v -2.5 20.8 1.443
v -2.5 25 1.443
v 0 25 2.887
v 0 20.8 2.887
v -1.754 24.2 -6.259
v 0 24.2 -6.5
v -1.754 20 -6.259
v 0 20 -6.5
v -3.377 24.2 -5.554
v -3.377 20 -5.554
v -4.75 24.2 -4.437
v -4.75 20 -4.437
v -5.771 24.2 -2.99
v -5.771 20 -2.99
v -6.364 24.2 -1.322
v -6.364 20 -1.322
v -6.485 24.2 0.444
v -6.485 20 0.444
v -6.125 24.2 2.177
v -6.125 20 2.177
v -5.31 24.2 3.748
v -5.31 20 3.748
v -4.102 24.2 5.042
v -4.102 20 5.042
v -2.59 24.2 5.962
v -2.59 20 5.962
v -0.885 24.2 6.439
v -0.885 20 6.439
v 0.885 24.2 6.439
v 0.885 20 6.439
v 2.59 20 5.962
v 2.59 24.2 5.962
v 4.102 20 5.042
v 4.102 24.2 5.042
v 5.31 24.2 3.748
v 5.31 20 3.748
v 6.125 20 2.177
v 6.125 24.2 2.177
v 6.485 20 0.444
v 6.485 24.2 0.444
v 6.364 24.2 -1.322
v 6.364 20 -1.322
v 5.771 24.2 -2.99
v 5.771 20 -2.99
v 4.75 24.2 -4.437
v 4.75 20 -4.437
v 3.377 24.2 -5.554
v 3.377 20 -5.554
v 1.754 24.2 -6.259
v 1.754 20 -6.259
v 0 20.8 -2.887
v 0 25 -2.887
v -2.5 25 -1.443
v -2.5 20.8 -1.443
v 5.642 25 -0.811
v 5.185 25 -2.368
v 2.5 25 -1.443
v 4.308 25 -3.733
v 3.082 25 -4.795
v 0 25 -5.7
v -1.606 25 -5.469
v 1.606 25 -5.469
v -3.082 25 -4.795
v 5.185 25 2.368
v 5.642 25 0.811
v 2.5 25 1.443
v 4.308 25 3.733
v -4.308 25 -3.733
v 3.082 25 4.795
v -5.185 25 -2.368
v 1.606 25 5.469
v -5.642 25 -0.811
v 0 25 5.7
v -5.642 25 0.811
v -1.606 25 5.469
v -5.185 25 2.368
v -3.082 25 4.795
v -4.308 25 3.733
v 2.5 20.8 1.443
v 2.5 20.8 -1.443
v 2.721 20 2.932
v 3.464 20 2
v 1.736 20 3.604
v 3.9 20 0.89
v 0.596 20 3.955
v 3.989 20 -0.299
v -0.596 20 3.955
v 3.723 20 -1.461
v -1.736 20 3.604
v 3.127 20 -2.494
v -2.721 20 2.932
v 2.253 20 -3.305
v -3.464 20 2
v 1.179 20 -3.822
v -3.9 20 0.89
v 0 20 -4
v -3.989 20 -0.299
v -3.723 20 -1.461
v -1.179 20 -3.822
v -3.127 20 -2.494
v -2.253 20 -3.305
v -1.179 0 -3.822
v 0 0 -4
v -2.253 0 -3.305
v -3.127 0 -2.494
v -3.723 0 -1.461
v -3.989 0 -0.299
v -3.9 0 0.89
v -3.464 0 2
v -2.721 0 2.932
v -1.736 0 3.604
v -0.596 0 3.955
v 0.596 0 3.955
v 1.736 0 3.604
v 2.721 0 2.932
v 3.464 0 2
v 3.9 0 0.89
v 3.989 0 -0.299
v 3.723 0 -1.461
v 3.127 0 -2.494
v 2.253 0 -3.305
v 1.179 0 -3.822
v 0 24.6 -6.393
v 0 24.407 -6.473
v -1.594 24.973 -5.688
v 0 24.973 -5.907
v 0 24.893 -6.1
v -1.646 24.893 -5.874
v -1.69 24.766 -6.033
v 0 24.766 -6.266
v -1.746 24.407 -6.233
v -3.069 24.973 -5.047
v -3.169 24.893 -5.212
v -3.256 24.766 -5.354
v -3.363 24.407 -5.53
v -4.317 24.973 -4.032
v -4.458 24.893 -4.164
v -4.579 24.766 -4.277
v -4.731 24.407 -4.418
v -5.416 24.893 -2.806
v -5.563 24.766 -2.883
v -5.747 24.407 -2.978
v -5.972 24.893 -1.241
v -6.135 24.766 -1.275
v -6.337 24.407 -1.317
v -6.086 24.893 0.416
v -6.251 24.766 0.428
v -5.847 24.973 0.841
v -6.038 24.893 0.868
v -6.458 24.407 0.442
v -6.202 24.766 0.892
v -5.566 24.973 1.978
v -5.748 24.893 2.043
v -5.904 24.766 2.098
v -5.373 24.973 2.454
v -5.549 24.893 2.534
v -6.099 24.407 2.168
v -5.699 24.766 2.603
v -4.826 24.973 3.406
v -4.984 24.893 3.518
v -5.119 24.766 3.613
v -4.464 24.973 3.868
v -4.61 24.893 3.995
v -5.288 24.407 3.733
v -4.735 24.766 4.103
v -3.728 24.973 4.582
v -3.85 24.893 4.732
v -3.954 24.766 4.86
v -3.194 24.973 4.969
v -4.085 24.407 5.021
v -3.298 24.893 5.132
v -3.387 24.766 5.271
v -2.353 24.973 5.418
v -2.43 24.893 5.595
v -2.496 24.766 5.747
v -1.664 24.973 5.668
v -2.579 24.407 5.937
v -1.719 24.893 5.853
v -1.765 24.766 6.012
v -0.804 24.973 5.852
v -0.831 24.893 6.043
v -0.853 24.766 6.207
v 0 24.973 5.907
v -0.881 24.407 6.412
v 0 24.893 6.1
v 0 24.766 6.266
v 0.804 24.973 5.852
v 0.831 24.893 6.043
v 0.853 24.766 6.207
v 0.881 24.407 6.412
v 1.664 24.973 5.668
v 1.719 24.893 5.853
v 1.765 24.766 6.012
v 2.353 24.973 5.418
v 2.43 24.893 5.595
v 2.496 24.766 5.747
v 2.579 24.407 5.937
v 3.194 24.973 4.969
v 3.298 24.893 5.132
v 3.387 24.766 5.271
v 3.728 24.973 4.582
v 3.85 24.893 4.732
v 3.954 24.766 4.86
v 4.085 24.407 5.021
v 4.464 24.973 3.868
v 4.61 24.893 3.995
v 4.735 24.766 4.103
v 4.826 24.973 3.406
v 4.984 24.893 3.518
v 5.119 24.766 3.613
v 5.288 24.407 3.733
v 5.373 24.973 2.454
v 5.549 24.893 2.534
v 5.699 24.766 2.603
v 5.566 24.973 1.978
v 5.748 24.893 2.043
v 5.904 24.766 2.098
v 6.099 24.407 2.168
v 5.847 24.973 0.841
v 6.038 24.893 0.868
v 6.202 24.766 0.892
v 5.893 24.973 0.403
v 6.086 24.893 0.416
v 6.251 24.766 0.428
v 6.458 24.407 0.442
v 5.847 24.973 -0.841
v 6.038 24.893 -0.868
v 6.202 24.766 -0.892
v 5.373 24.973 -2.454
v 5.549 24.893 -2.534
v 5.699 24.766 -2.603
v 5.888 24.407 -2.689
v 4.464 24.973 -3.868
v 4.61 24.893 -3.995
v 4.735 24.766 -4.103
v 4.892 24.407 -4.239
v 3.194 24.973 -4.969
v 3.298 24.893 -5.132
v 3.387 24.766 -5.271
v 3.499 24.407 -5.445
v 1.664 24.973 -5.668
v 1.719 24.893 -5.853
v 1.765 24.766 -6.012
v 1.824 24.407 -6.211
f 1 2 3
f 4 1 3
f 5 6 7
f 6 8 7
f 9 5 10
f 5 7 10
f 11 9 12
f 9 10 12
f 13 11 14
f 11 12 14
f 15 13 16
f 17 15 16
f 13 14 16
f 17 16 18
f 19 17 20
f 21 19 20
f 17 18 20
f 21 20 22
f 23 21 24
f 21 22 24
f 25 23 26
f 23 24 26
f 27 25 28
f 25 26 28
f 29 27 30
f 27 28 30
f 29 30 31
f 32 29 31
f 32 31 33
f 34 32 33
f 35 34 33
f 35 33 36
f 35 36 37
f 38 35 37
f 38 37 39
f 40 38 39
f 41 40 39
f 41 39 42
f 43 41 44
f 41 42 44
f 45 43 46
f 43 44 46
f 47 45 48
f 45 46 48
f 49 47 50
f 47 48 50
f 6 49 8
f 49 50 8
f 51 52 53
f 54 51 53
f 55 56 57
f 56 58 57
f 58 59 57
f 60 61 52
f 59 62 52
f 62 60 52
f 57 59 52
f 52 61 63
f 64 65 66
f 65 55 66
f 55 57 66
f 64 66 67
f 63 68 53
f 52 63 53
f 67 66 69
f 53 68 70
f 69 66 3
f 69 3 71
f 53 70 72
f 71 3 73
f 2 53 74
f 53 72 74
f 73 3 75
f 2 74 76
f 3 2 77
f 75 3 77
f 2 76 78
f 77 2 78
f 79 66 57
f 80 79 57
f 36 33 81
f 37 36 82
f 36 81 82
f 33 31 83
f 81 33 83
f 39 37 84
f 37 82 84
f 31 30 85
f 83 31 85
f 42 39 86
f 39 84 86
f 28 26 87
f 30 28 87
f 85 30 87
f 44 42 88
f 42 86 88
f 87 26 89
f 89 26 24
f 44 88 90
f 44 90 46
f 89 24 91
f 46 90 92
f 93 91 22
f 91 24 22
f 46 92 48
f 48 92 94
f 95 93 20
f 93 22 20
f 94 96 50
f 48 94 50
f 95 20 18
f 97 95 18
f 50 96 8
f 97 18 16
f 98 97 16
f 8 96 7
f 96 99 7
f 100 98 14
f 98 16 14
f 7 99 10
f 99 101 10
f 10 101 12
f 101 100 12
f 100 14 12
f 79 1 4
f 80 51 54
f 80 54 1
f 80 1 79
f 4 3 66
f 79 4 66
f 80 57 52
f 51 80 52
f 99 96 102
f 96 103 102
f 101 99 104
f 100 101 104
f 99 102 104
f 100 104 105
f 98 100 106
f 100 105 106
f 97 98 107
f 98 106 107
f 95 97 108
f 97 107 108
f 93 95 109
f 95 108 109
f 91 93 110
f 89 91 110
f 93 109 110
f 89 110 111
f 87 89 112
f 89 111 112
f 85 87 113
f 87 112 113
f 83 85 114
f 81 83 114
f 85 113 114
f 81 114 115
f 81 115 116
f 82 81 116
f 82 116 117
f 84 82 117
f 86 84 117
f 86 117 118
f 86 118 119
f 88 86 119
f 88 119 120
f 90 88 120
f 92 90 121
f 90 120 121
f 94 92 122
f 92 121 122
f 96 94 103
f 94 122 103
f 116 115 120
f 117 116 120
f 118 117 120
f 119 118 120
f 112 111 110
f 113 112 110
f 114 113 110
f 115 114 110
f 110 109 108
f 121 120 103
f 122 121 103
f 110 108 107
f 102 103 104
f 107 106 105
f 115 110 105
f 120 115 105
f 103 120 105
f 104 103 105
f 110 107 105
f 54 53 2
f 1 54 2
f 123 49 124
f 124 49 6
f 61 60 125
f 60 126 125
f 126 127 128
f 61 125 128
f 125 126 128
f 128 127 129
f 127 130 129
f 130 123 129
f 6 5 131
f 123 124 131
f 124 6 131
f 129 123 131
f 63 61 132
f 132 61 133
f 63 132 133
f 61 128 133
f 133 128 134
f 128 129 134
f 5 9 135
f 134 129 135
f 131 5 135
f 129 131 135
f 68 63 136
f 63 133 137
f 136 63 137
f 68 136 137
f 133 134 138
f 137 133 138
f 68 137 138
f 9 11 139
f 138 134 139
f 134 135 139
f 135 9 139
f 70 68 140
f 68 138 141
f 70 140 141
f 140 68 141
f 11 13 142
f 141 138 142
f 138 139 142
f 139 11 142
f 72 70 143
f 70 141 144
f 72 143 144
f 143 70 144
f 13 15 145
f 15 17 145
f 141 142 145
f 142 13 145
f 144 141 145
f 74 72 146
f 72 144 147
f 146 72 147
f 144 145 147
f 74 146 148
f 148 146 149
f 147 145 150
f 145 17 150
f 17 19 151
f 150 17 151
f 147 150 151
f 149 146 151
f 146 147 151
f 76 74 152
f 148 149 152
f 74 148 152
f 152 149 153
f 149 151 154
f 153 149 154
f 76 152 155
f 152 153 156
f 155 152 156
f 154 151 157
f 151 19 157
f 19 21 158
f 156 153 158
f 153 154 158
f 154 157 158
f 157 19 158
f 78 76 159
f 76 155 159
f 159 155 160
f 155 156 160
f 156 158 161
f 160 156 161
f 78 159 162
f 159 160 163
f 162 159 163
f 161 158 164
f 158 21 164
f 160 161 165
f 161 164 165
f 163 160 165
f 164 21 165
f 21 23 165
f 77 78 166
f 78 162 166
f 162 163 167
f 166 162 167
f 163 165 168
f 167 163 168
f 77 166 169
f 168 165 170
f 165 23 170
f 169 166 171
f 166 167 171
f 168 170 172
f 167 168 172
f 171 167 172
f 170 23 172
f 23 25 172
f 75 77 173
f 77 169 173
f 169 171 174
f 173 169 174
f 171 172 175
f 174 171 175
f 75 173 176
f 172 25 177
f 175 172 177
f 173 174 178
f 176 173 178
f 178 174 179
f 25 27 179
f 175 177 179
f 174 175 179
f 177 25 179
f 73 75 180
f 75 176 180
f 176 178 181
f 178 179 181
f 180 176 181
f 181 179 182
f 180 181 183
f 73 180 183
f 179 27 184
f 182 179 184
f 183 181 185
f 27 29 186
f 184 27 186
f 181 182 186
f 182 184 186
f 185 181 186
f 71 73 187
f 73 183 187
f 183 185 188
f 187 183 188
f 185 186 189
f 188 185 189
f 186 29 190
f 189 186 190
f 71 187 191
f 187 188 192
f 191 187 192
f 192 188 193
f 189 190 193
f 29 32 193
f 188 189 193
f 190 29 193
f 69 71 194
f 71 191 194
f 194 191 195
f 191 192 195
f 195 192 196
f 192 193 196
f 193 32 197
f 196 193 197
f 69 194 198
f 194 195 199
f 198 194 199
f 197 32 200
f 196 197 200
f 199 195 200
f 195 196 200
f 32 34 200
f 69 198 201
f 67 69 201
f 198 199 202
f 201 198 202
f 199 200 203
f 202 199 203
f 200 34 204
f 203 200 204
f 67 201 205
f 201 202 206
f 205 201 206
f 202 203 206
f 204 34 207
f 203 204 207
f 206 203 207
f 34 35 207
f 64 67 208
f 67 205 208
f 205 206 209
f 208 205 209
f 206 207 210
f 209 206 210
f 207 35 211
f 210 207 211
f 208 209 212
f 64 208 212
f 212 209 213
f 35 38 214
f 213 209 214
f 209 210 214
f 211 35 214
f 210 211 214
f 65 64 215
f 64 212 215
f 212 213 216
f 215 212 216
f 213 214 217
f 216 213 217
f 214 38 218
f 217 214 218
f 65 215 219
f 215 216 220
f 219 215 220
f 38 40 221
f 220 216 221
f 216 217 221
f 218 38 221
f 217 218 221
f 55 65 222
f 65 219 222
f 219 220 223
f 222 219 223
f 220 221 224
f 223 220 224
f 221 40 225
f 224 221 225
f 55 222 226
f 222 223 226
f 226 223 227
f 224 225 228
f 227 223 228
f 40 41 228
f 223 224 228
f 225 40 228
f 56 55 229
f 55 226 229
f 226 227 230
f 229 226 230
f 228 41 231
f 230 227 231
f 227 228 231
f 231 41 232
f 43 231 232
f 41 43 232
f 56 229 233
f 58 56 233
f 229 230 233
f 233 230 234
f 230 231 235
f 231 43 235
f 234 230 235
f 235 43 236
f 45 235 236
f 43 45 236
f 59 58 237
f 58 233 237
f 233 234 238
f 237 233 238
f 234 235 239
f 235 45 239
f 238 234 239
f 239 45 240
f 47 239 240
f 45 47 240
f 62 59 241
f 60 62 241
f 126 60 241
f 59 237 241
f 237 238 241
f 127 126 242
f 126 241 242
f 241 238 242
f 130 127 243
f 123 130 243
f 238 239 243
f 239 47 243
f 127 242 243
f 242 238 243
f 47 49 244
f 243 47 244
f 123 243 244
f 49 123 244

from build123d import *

# Parameters (mm, degrees)
CUT_EXTRUDE1_DEPTH = 4.2


with BuildPart() as part:
    # Sketch1 → Revolve1 (revolve)
    with BuildSketch(Plane.XY, mode=Mode.PRIVATE) as revolve1_sk:
        with BuildLine():
            Line((0, 25), (-5.7, 25))
            ThreePointArc((-5.7, 25), (-6.265685425, 24.765685425), (-6.5, 24.2))
            Line((-6.5, 24.2), (-6.5, 20))
            Line((-6.5, 20), (-4, 20))
            Line((-4, 20), (-4, 0))
            Line((-4, 0), (0, 0))
            Line((0, 0), (0, 25))
        make_face()
    revolve(revolve1_sk.sketch.rotate(Axis((0, 0, 0), (0, 1, 0)), 270), axis=Axis((0, 0, 0), (0, 1, 0)))

    # Sketch2 → Cut-Extrude1 (cut)
    with BuildSketch(Plane(origin=(0, 25, 0), x_dir=(1, 0, 0), z_dir=(0, 1, 0))):
        Polygon((0, 2.886751346), (-2.5, 1.443375673), (-2.5, -1.443375673), (0, -2.886751346), (2.5, -1.443375673), (2.5, 1.443375673), align=None)
    extrude(amount=-CUT_EXTRUDE1_DEPTH, mode=Mode.SUBTRACT)


solid = part.part
